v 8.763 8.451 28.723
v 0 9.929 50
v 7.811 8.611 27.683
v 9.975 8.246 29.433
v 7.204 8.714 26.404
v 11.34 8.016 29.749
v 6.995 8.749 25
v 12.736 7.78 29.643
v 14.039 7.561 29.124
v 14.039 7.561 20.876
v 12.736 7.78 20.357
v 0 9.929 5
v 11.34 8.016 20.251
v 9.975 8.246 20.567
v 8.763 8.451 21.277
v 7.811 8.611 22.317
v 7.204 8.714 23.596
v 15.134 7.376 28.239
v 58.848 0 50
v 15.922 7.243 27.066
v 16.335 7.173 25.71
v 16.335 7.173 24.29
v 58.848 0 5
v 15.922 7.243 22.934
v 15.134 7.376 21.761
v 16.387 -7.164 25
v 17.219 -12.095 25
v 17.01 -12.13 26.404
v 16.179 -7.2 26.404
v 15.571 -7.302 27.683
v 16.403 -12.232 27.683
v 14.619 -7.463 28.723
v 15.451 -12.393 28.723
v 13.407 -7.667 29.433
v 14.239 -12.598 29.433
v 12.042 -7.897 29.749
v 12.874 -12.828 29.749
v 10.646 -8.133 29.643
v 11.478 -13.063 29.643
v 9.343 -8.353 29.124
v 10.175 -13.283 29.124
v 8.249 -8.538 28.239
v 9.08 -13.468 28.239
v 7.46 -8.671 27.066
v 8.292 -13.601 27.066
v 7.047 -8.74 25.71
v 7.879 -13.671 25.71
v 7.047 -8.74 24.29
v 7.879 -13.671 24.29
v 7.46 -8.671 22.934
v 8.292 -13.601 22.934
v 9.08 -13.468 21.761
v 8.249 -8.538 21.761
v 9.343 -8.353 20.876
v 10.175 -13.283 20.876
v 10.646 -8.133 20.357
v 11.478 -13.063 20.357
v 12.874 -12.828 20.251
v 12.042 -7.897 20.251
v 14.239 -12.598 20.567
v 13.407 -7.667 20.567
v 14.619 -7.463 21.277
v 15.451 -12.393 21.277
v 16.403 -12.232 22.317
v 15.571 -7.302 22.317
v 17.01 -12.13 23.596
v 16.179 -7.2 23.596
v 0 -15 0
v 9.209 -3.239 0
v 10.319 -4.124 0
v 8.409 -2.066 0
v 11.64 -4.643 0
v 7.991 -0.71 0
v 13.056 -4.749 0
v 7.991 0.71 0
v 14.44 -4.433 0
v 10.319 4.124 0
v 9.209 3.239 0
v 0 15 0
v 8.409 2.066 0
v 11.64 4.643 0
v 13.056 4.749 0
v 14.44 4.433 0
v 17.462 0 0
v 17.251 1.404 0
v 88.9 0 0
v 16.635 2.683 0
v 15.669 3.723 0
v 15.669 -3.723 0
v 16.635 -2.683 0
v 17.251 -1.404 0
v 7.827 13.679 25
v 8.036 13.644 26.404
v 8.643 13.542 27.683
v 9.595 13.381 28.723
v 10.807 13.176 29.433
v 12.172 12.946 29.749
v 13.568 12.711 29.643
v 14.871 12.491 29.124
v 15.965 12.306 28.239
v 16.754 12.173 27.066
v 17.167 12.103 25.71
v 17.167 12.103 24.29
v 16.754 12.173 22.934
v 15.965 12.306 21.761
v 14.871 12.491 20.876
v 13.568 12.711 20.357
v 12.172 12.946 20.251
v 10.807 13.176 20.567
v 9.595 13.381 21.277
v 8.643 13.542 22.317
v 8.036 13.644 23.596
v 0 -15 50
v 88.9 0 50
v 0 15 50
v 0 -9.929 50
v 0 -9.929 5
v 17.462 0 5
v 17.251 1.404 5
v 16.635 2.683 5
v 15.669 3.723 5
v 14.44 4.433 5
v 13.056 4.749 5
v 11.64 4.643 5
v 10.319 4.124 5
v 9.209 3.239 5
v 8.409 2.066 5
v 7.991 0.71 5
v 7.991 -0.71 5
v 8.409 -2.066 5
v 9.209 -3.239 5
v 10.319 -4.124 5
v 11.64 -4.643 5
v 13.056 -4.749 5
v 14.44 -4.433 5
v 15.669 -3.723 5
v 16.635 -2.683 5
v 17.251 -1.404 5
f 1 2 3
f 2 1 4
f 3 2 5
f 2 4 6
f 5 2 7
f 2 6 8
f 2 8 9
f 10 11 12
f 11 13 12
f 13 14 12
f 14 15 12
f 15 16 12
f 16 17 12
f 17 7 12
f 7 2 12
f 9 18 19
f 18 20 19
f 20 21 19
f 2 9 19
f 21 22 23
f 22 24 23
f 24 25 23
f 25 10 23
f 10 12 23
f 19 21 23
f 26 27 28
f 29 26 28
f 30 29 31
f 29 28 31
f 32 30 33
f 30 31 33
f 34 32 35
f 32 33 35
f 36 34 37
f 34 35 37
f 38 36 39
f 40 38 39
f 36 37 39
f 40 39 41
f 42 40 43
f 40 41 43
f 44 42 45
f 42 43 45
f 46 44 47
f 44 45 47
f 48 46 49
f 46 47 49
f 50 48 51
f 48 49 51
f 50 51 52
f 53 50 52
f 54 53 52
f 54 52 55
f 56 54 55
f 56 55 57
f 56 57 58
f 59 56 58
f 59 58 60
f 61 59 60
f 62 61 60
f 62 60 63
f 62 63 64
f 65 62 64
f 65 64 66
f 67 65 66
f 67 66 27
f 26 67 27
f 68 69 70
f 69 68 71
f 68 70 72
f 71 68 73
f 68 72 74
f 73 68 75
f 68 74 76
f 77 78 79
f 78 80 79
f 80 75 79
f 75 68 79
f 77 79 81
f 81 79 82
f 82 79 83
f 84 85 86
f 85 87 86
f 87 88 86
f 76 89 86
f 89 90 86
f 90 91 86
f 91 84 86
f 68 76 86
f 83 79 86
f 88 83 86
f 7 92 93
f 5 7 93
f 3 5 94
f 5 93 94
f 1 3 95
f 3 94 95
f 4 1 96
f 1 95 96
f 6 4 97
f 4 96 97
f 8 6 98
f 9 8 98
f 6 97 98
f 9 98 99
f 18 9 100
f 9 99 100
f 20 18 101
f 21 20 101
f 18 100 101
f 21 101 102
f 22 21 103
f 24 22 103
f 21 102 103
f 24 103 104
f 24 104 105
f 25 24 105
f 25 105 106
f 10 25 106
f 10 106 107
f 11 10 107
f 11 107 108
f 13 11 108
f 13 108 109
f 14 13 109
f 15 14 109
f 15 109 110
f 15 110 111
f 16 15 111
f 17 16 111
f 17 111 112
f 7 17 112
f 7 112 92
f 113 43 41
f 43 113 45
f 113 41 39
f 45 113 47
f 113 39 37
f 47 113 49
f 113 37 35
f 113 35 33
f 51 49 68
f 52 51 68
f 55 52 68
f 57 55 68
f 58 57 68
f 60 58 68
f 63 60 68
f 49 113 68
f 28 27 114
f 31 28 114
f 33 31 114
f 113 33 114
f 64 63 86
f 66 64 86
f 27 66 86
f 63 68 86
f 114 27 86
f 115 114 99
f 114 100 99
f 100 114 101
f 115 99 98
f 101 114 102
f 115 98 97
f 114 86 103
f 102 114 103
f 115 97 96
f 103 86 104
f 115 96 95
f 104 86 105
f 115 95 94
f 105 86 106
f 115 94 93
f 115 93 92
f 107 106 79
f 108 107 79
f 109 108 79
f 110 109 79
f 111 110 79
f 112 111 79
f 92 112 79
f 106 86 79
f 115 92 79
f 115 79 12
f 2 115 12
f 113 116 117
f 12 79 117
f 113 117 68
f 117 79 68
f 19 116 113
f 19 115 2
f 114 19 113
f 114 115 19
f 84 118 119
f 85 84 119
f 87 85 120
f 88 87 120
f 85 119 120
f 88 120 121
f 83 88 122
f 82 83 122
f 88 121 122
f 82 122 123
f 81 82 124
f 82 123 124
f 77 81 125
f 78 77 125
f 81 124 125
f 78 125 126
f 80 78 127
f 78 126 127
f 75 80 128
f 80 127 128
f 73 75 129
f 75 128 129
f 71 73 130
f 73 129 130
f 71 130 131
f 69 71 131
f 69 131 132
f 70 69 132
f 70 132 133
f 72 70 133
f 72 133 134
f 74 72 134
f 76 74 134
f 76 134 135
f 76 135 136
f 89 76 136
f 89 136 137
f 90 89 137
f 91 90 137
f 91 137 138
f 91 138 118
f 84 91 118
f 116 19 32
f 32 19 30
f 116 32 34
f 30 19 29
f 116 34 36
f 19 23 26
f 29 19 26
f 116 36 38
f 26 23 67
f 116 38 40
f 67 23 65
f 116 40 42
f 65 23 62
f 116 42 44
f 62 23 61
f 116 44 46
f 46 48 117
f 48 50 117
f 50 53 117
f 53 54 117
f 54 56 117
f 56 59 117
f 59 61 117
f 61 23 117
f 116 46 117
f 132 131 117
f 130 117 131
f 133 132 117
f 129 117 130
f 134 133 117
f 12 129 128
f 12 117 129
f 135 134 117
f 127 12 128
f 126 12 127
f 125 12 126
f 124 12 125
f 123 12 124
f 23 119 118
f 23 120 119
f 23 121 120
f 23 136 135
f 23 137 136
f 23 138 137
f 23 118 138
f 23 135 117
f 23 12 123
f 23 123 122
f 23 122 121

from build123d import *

# Parameters (mm, degrees)
EXTRUDE1_DEPTH = 5
EXTRUDE2_DEPTH = 50
SKETCH3_R      = 4.7625
EXTRUDE3_DEPTH = 101.763138101
EXTRUDE4_REACH = 106.149
SKETCH4_R      = 4.7625
EXTRUDE5_REACH = 106.149
SKETCH5_R      = 4.7625


with BuildPart() as part:
    # Sketch1 → Extrude1 (new body)
    with BuildSketch(Plane.XY):
        Polygon((0, -15), (88.9, 0), (0, 15), align=None)
    extrude(amount=EXTRUDE1_DEPTH)

    # Sketch1<4> → Extrude2 (add)
    with BuildSketch(Plane.XY):
        Polygon((0, 9.929325872), (58.847804665, 0), (0, -9.929325872), (0, -15), (88.9, 0), (0, 15), align=None)
    extrude(amount=EXTRUDE2_DEPTH)

    # Sketch3 → Extrude3 (cut, through all)
    with BuildSketch(Plane.XY.offset(5)):
        with Locations((12.7, 0)):
            Circle(SKETCH3_R)
    extrude(amount=-EXTRUDE3_DEPTH, mode=Mode.SUBTRACT)

    # Sketch4 → Extrude4 (cut, up to next)
    with BuildSketch(Plane(origin=(2.460873919, -14.584779429, 0), x_dir=(0.9860621829168484, 0.16637719621769093, 0), z_dir=(0.16637719621769093, -0.9860621829168484, 0)), mode=Mode.PRIVATE) as extrude4_sk1:
        with Locations((10.204342057, 25)):
            Circle(SKETCH4_R)
    extrude4_tool1 = extrude(extrude4_sk1.sketch, amount=-EXTRUDE4_REACH, mode=Mode.PRIVATE) & part.part
    add(extrude4_tool1.solids().sort_by_distance((12.52299, -12.88701, 25))[0], mode=Mode.SUBTRACT)

    # Sketch5 → Extrude5 (cut, up to next)
    with BuildSketch(Plane(origin=(2.460873919, 14.584779429, 0), x_dir=(0.9860621829168484, -0.16637719621769093, 0), z_dir=(0.16637719621769093, 0.9860621829168484, 0)), mode=Mode.PRIVATE) as extrude5_sk1:
        with Locations((10.204342057, -25)):
            Circle(SKETCH5_R)
    extrude5_tool1 = extrude(extrude5_sk1.sketch, amount=-EXTRUDE5_REACH, mode=Mode.PRIVATE) & part.part
    add(extrude5_tool1.solids().sort_by_distance((12.52299, 12.88701, 25))[0], mode=Mode.SUBTRACT)


solid = part.part
